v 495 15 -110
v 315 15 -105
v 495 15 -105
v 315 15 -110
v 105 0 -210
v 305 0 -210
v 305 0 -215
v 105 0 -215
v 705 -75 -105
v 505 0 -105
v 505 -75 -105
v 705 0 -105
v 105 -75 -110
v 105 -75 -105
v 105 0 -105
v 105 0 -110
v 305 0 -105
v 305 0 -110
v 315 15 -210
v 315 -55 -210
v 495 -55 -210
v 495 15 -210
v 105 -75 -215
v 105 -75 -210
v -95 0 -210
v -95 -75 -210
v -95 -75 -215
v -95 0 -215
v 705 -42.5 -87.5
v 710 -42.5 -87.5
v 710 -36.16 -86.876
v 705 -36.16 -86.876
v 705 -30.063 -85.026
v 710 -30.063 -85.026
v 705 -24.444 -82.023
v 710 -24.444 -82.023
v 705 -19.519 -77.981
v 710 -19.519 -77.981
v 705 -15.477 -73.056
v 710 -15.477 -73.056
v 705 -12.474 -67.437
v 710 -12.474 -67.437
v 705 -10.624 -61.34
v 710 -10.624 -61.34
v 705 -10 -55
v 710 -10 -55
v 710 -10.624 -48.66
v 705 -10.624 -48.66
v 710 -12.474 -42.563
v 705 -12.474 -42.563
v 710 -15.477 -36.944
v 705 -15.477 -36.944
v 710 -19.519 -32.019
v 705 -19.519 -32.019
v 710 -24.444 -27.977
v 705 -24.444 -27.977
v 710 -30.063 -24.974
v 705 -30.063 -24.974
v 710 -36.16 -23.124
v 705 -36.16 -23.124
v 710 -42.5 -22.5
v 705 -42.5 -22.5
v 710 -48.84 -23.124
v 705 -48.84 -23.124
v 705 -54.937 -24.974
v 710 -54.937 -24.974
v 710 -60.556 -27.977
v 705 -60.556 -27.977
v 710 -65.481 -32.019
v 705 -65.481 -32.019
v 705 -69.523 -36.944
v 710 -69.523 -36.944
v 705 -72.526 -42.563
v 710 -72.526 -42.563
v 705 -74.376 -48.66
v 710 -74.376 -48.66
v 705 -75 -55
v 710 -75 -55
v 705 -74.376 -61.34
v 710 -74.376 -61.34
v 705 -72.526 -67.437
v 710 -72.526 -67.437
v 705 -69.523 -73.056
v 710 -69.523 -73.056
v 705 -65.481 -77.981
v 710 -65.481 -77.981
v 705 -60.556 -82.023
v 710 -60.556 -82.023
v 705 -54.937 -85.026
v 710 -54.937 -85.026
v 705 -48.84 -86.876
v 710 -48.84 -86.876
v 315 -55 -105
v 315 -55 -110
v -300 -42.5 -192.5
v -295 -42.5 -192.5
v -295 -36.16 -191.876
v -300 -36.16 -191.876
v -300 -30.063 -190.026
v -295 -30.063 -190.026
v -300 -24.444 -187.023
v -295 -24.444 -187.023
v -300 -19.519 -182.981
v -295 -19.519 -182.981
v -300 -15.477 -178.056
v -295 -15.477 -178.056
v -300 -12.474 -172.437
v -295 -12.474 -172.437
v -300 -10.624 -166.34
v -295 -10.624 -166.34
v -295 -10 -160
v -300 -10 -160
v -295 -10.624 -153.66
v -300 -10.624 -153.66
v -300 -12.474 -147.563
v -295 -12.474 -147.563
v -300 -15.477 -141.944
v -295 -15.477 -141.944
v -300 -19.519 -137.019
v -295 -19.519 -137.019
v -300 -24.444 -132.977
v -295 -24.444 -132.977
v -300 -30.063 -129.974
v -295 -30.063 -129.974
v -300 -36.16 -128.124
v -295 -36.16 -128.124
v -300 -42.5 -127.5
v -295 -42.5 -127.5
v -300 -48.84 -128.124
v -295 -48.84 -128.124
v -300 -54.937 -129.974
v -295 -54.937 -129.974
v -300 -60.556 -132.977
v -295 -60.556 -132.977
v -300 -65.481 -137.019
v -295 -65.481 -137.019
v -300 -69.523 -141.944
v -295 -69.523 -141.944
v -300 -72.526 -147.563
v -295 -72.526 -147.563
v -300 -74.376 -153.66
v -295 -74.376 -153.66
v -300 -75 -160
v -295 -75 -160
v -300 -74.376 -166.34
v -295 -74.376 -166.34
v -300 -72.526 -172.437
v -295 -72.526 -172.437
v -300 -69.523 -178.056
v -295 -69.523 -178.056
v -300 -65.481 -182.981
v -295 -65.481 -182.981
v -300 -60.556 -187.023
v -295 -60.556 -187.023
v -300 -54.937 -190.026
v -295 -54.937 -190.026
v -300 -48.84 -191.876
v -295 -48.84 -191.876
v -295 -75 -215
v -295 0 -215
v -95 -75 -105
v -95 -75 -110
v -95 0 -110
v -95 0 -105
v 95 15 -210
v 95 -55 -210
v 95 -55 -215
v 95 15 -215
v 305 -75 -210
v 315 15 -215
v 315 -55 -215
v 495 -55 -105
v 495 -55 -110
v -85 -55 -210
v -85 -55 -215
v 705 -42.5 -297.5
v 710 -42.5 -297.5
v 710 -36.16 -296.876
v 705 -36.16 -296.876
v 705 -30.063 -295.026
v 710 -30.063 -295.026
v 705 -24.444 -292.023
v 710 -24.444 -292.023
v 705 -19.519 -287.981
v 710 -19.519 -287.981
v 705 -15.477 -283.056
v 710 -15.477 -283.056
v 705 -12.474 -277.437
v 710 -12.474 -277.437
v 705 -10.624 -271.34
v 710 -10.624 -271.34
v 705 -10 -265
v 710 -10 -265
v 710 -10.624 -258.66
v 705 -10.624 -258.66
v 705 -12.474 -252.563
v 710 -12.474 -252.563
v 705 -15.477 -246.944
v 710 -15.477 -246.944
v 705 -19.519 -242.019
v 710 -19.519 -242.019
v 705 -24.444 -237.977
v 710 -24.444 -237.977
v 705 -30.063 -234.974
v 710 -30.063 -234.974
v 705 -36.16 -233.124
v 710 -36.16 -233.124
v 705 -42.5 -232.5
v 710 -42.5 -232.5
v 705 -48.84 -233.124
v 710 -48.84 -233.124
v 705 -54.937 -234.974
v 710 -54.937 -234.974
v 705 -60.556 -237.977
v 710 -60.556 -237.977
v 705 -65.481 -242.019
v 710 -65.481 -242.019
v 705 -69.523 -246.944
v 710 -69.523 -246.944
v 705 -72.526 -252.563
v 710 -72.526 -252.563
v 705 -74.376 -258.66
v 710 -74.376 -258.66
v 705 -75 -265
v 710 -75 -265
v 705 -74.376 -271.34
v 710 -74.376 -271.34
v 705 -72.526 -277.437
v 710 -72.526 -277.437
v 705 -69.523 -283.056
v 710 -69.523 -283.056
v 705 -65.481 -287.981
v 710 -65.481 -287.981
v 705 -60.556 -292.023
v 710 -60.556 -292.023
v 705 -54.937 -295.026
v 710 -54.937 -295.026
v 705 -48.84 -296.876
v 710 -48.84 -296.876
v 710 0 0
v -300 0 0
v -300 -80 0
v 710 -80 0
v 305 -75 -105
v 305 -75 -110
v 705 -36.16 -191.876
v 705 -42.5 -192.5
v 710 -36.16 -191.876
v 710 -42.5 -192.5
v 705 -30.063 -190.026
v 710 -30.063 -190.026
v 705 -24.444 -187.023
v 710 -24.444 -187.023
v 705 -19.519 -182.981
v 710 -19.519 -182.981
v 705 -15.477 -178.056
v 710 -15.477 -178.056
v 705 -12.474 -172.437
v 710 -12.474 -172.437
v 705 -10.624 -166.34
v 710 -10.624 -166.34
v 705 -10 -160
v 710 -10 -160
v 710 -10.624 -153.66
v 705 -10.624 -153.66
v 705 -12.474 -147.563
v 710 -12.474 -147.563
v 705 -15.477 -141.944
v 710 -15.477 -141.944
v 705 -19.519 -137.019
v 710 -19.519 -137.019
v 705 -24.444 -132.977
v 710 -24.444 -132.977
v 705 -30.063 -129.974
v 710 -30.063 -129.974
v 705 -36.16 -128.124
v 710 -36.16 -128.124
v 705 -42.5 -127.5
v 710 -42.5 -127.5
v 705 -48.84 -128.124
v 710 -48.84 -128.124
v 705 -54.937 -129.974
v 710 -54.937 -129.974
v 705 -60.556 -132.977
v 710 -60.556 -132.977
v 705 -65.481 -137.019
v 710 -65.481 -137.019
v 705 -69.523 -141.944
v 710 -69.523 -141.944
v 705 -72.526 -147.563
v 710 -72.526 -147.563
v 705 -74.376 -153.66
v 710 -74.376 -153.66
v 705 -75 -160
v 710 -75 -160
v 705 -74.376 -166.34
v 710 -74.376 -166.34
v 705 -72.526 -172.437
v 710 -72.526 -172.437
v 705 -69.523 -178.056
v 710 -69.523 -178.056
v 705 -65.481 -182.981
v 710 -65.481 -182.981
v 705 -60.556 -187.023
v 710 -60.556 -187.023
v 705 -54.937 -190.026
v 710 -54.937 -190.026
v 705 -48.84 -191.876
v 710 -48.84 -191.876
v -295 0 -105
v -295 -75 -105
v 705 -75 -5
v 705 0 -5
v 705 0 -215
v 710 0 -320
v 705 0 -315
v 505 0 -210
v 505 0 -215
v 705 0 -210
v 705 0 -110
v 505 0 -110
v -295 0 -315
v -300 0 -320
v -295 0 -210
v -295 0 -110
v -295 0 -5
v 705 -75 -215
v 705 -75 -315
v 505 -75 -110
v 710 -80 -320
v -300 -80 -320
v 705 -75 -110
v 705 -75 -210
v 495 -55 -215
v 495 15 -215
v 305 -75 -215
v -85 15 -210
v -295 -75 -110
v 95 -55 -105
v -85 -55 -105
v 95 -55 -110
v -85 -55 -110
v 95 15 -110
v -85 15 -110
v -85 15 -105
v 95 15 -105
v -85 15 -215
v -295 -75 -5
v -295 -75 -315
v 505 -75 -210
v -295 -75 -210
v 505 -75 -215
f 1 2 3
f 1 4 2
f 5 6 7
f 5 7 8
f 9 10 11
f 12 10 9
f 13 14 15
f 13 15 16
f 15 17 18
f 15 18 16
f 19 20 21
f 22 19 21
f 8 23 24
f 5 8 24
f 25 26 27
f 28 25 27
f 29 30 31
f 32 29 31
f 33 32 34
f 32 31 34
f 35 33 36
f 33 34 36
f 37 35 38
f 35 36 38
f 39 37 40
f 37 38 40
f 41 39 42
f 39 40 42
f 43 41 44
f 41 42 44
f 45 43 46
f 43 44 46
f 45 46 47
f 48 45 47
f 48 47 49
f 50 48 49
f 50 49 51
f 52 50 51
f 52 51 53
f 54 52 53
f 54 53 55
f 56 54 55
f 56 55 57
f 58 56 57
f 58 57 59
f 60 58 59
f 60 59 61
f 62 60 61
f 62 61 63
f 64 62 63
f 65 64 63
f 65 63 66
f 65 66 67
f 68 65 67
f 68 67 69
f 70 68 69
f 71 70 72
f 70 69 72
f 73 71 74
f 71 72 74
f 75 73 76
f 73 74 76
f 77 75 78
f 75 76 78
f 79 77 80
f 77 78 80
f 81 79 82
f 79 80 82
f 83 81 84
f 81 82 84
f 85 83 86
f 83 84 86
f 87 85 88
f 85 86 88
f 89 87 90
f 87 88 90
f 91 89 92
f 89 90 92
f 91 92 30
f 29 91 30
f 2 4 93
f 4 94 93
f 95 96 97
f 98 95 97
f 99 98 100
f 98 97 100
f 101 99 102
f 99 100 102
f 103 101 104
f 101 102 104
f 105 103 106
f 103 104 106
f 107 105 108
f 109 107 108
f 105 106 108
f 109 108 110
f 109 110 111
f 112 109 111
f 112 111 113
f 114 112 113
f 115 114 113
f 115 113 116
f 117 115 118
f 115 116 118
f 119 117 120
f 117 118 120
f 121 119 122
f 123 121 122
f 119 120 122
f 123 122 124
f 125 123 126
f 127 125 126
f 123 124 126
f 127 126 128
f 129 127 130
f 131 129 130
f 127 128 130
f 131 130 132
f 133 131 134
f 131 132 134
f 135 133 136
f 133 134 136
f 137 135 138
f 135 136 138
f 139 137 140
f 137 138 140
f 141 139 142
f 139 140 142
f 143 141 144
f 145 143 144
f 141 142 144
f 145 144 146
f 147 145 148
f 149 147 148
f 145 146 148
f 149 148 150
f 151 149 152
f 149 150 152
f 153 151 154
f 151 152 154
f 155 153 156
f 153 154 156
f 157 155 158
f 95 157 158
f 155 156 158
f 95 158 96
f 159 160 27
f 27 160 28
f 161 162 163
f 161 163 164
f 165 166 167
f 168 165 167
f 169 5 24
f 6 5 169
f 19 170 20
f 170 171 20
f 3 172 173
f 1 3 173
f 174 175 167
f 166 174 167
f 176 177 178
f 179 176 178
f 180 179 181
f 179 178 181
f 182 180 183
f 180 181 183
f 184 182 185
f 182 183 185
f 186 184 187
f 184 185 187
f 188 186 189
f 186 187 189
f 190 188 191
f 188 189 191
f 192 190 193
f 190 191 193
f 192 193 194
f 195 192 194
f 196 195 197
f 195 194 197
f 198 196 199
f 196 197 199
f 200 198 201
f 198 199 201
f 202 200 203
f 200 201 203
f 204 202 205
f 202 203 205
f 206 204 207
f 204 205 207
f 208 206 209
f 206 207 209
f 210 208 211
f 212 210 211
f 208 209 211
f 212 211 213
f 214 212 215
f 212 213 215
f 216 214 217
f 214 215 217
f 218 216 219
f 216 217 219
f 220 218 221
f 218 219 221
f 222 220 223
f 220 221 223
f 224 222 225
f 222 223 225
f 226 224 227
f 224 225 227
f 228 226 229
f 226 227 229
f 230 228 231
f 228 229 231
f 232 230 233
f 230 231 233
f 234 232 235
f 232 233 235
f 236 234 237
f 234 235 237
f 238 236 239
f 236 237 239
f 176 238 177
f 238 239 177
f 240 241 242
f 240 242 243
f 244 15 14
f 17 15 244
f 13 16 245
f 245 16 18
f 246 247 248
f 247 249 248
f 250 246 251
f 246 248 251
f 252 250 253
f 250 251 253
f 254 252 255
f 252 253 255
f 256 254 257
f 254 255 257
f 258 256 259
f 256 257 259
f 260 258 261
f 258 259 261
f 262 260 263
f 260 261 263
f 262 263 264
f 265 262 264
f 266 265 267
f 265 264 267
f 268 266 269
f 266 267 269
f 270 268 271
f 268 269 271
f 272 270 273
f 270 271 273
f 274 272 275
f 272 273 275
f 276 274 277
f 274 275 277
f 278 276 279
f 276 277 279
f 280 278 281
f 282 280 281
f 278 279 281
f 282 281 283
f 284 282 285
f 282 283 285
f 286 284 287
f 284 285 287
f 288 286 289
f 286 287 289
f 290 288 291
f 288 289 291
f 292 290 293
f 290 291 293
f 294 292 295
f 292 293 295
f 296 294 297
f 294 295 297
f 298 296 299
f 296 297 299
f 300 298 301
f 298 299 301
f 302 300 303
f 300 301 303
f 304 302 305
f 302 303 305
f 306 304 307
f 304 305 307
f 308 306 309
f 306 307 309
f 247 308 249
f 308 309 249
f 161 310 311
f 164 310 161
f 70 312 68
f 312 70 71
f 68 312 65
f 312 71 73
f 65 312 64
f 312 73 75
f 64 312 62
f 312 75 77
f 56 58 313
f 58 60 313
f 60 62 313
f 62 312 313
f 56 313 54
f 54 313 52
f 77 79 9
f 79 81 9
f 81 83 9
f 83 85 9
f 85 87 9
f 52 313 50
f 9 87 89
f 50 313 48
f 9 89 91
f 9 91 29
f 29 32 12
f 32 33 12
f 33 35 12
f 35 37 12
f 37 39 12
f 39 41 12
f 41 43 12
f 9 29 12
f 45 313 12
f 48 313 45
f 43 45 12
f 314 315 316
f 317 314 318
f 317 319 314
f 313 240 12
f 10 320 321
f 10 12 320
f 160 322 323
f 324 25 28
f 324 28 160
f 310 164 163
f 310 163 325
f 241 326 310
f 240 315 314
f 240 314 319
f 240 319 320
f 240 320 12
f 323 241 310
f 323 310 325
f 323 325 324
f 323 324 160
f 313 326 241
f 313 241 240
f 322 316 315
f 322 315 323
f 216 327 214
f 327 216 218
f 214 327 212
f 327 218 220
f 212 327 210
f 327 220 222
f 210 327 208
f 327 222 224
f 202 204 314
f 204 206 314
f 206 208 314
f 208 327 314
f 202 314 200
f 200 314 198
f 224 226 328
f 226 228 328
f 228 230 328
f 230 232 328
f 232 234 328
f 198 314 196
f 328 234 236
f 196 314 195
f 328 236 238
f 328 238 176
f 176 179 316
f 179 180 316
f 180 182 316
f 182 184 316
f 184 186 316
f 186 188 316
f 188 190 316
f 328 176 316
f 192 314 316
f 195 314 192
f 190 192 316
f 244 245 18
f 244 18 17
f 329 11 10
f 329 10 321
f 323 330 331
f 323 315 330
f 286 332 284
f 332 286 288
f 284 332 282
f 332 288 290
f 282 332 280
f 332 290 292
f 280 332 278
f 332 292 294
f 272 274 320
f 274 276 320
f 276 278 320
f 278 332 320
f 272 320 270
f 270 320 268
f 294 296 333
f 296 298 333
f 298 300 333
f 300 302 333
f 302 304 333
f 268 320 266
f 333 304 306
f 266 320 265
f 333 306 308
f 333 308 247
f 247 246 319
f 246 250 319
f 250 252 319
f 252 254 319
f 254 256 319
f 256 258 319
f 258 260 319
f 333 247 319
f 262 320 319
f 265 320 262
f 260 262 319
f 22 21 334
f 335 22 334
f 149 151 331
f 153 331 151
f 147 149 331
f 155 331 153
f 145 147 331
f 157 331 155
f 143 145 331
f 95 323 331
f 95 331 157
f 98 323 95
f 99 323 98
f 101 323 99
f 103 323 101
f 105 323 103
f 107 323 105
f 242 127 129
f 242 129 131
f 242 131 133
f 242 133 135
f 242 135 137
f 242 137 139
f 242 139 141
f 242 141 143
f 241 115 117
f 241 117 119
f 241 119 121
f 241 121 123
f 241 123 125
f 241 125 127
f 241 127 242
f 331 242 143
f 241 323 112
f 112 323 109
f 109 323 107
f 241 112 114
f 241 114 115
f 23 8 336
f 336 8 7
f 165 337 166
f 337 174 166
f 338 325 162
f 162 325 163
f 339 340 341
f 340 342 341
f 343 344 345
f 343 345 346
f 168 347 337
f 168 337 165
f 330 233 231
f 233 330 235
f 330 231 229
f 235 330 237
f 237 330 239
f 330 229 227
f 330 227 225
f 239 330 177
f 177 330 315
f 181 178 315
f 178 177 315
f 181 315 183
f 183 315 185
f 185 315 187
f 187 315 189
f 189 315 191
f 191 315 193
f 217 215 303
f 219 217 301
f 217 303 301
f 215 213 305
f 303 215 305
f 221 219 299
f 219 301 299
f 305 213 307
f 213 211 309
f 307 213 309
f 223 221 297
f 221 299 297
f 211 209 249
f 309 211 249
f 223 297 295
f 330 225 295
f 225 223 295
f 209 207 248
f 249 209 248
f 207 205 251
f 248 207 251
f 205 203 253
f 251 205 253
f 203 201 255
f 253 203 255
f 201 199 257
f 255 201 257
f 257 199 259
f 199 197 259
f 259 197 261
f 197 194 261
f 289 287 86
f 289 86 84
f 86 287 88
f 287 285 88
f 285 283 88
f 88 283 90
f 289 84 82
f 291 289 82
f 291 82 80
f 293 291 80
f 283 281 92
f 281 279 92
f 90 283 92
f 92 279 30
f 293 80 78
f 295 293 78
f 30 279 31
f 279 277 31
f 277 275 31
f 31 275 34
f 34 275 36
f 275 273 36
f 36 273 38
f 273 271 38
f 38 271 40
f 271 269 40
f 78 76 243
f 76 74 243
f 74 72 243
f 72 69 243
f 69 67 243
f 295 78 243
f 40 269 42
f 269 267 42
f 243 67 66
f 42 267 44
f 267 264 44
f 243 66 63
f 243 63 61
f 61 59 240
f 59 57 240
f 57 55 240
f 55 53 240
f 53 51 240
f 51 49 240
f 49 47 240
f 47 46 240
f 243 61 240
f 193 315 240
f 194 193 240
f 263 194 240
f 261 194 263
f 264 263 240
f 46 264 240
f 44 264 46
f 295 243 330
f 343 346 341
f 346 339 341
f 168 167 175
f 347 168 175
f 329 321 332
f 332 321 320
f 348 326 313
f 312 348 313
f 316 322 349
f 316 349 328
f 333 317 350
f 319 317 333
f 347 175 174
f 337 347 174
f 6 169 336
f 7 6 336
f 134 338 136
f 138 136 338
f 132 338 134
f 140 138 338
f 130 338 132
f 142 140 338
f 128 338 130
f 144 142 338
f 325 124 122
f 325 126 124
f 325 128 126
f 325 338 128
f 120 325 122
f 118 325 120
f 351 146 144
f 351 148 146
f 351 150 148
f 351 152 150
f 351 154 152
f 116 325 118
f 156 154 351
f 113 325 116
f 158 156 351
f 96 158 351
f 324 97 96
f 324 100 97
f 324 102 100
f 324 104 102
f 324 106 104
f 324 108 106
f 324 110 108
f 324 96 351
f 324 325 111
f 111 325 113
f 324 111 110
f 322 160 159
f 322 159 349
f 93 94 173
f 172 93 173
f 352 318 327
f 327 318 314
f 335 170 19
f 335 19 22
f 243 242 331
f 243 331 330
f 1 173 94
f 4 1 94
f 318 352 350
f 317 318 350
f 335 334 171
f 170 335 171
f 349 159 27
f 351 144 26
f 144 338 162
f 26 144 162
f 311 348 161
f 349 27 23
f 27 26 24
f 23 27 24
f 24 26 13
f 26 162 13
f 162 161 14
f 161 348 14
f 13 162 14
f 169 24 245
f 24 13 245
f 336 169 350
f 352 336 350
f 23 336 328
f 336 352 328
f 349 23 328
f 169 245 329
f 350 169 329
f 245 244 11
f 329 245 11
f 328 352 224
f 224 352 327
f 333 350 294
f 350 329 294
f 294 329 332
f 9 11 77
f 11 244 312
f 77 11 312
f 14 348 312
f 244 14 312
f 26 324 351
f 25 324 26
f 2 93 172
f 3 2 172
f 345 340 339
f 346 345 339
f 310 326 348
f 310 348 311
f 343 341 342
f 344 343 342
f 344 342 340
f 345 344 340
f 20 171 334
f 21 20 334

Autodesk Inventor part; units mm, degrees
ref_plane "YZ Plane" through (0, 0, 0) normal (1, 0, 0) x (0, 1, 0)
ref_plane "XZ Plane" through (0, 0, 0) normal (0, 1, 0) x (-1, 0, 0)
sketch "Boceto1" plane through (0, 0, 0) normal (0, 1, 0) x (-1, 0, 0)
  line L0 (0, 0) -> (300, 0)
  line L1 (300, 0) -> (300, -320)
  line L2 (300, -320) -> (-710, -320)
  line L3 (0, 0) -> (-400, 0)
  line L4 (-400, 0) -> (-710, 0)
  line L5 (-710, 0) -> (-710, -320)
  line L6 (300, -105) -> (-710, -105)
  line L7 (300, -110) -> (-710, -110)
  line L8 (300, -210) -> (-710, -210)
  line L9 (300, -215) -> (-710, -215)
  line L10 (295, 0) -> (295, -320)
  line L11 (-705, 0) -> (-705, -320)
  line L12 (300, -5) -> (-710, -5)
  line L13 (300, -315) -> (-710, -315)
  point P0 (300, -147.5)
  point P1 (295, -105)
  point P2 (-705, -105)
  point P3 (-705, -5)
  point P4 (295, -5)
  point P5 (295, -215)
  point P6 (295, -315)
  point P7 (-705, -315)
  point P8 (-705, -215)
  point P9 (295, -110)
  point P10 (295, -210)
  point P11 (-705, -210)
  point P12 (-705, -110)
  dimension "d6" = 100
  dimension "d7" = 37.5
  dimension "d9" = 5
  dimension "d10" = 5
  dimension "d14" = 5
  dimension "d15" = 5
  dimension "d16" = 5
  dimension "d17" = 5
  dimension "d38" = 100
  dimension "d39" = 100
  dimension "d59" = 1010
extrude "Extrusión1" add sketch "Boceto1" against normal blind 75 contours L0 L10 L12 L11 L4 L3 | L0 L1 L12 L10 | L12 L1 L6 L10 | L11 L12 L5 L4 | L10 L7 L11 L6 | L6 L1 L7 L10 | L11 L6 L5 L12 | L11 L7 L5 L6 | L7 L1 L8 L10 | L11 L8 L5 L7 | L10 L9 L11 L8 | L8 L1 L9 L10 | L11 L9 L5 L8 | L9 L1 L13 L10 | L11 L13 L5 L9 | L13 L1 L2 L10 | L10 L2 L11 L13 | L11 L2 L5 L13
sketch "Boceto2" plane through (0, -75, 0) normal (0, -1, 0) x (1, 0, 0)
  line L0 (710, -320) -> (710, 0) projected
  line L1 (710, -320) -> (-300, -320)
  line L2 (-300, -320) -> (-300, 0)
  line L3 (-300, 0) -> (710, 0)
  line L4 (710, 0) -> (710, -320)
  point P0 (0, 0)
  point P1 (710, 0)
extrude "Extrusión2" add sketch "Boceto2" along normal blind 5
sketch "Boceto5" plane through (710, 0, 0) normal (1, 0, 0) x (0, 0, -1)
  line L0 (0, 0) -> (0, -80) projected
  line L1 (320, 0) -> (0, 0) projected
  line L2 (0, -80) -> (320, -80) projected
  circle A0 centre (160, -42.5) radius 32.5
  circle A1 centre (265, -42.5) radius 32.5
  circle A2 centre (55, -42.5) radius 32.5
  line L3 (55, 0) -> (55, -80)
  line L4 (320, -80) -> (0, -80) projected
  line L5 (160, 0) -> (160, -80)
  line L6 (265, 0) -> (265, -80)
  point P0 (0, 0)
  point P1 (5, 0)
  point P2 (105, 0)
  point P3 (110, 0)
  point P4 (210, 0)
  point P5 (215, 0)
  point P6 (315, 0)
  dimension "d40" = 5
  dimension "d41" = 5
  dimension "d42" = 5
  dimension "d43" = 5
  dimension "d44" = 100
  dimension "d45" = 100
  dimension "d46" = 50
  dimension "d47" = 65
  dimension "d48" = 50
  dimension "d49" = 65
  dimension "d50" = 50
  dimension "d51" = 65
  dimension "d52" = 37.5
  dimension "d53" = 37.5
  dimension "d54" = 37.5
extrude "Extrusión4" cut sketch "Boceto5" against normal blind 75 contours L3 A2 | A2 L3 | L6 A1 | A1 L6
extrude "Extrusión5" cut sketch "Boceto5" against normal through all contours L5 A0 | A0 L5
sketch "Boceto7" plane through (0, 0, 0) normal (0, 1, 0) x (1, 0, 0)
  line L0 (710, 320) -> (-300, 320) projected
  line L1 (-300, 320) -> (-300, 0) projected
  line L2 (-300, 0) -> (710, 0) projected
  line L3 (710, 0) -> (710, 320) projected
  line L4 (705, 105) -> (705, 5) projected
  line L5 (705, 5) -> (-295, 5) projected
  line L6 (-295, 5) -> (-295, 105) projected
  line L7 (-295, 105) -> (705, 105) projected
  line L8 (705, 315) -> (705, 215) projected
  line L9 (705, 215) -> (-295, 215) projected
  line L10 (-295, 215) -> (-295, 315) projected
  line L11 (-295, 315) -> (705, 315) projected
  line L12 (-295, 210) -> (705, 210) projected
  line L13 (705, 210) -> (705, 110) projected
  line L14 (705, 110) -> (-295, 110) projected
  line L15 (-295, 110) -> (-295, 210) projected
  line L16 (-295, 105) -> (705, 105) projected
  line L17 (-95, 105) -> (105, 105)
  line L18 (105, 105) -> (105, 110)
  line L19 (105, 110) -> (-95, 110)
  line L20 (-95, 110) -> (-95, 105)
  line L21 (705, 110) -> (-295, 110) projected
  line L22 (305, 105) -> (505, 105)
  line L23 (505, 105) -> (505, 110)
  line L24 (505, 110) -> (305, 110)
  line L25 (305, 110) -> (305, 105)
  line L26 (-295, 210) -> (705, 210) projected
  line L27 (-295, 215) -> (705, 215) projected
  line L28 (505, 210) -> (305, 210)
  line L29 (305, 210) -> (305, 215)
  line L30 (305, 215) -> (505, 215)
  line L31 (505, 215) -> (505, 210)
  line L32 (105, 210) -> (-95, 210)
  line L33 (-95, 210) -> (-95, 215)
  line L34 (-95, 215) -> (105, 215)
  line L35 (105, 215) -> (105, 210)
  point P0 (0, 0)
  point P1 (105, 105)
  point P2 (505, 105)
  point P3 (-95, 210)
  point P4 (305, 210)
  dimension "d86" = 200
  dimension "d87" = 200
  dimension "d88" = 200
  dimension "d89" = 200
  dimension "d90" = 200
  dimension "d91" = 200
  dimension "d92" = 200
  dimension "d93" = 200
extrude "Extrusión7" cut sketch "Boceto7" against normal blind 75 contours L7 L25 L14 L23 | L7 L20 L14 L18 | L12 L29 L9 L31 | L12 L33 L9 L35
ref_plane "Plano de trabajo1" through (0, -55, 0) normal (0, 1, 0) x (1, 0, 0)
sketch "Boceto11" plane through (0, -55, 0) normal (0, 1, 0) x (1, 0, 0)
  line L0 (305, 210) -> (105, 210) projected
  line L1 (105, 215) -> (105, 210) projected
  line L2 (105, 215) -> (305, 215) projected
  line L3 (305, 210) -> (305, 215) projected
  line L4 (305, 105) -> (105, 105) projected
  line L5 (105, 110) -> (105, 105) projected
  line L6 (105, 110) -> (305, 110) projected
  line L7 (305, 105) -> (305, 110) projected
  line L8 (505, 215) -> (505, 210) projected
  line L9 (505, 215) -> (705, 215) projected
  line L10 (705, 215) -> (705, 265) projected
  line L11 (705, 265) -> (705, 315) projected
  line L12 (705, 315) -> (-295, 315) projected
  line L13 (-295, 315) -> (-295, 215) projected
  line L14 (-295, 215) -> (-95, 215) projected
  line L15 (-95, 210) -> (-95, 215) projected
  line L16 (-95, 210) -> (-295, 210) projected
  line L17 (-295, 210) -> (-295, 160) projected
  line L18 (-295, 160) -> (-295, 110) projected
  line L19 (-295, 110) -> (-95, 110) projected
  line L20 (-95, 105) -> (-95, 110) projected
  line L21 (-95, 105) -> (-295, 105) projected
  line L22 (-295, 105) -> (-295, 5) projected
  line L23 (-295, 5) -> (705, 5) projected
  line L24 (705, 5) -> (705, 55) projected
  line L25 (705, 55) -> (705, 105) projected
  line L26 (705, 105) -> (505, 105) projected
  line L27 (505, 110) -> (505, 105) projected
  line L28 (505, 110) -> (705, 110) projected
  line L29 (705, 110) -> (705, 160) projected
  line L30 (705, 160) -> (705, 210) projected
  line L31 (705, 210) -> (505, 210) projected
  line L32 (105, 210) -> (305, 210) projected
  line L33 (705, 105) -> (505, 105) projected
  line L34 (305, 105) -> (105, 105) projected
  line L35 (-85, 210) -> (95, 210)
  line L36 (95, 210) -> (95, 215)
  line L37 (95, 215) -> (-85, 215)
  line L38 (-85, 215) -> (-85, 210)
  line L39 (-85, 105) -> (95, 105)
  line L40 (95, 105) -> (95, 110)
  line L41 (95, 110) -> (-85, 110)
  line L42 (-85, 110) -> (-85, 105)
  line L43 (315, 105) -> (495, 105)
  line L44 (495, 105) -> (495, 110)
  line L45 (495, 110) -> (315, 110)
  line L46 (315, 110) -> (315, 105)
  line L47 (315, 210) -> (495, 210)
  line L48 (495, 210) -> (495, 215)
  line L49 (495, 215) -> (315, 215)
  line L50 (315, 215) -> (315, 210)
  point P0 (0, 0)
  point P1 (495, 210)
  dimension "d113" = 10
  dimension "d114" = 10
  dimension "d115" = 10
  dimension "d116" = 10
  dimension "d117" = 10
  dimension "d118" = 10
  dimension "d119" = 10
  dimension "d120" = 10
extrude "Extrusión8" add sketch "Boceto11" along normal blind 70 contours L38 L37 L36 L35 | L42 L41 L40 L39 | L46 L45 L44 L43 | L50 L49 L48 L47
properties part number "Distribuidor de truchas" material "Plástico ABS"
